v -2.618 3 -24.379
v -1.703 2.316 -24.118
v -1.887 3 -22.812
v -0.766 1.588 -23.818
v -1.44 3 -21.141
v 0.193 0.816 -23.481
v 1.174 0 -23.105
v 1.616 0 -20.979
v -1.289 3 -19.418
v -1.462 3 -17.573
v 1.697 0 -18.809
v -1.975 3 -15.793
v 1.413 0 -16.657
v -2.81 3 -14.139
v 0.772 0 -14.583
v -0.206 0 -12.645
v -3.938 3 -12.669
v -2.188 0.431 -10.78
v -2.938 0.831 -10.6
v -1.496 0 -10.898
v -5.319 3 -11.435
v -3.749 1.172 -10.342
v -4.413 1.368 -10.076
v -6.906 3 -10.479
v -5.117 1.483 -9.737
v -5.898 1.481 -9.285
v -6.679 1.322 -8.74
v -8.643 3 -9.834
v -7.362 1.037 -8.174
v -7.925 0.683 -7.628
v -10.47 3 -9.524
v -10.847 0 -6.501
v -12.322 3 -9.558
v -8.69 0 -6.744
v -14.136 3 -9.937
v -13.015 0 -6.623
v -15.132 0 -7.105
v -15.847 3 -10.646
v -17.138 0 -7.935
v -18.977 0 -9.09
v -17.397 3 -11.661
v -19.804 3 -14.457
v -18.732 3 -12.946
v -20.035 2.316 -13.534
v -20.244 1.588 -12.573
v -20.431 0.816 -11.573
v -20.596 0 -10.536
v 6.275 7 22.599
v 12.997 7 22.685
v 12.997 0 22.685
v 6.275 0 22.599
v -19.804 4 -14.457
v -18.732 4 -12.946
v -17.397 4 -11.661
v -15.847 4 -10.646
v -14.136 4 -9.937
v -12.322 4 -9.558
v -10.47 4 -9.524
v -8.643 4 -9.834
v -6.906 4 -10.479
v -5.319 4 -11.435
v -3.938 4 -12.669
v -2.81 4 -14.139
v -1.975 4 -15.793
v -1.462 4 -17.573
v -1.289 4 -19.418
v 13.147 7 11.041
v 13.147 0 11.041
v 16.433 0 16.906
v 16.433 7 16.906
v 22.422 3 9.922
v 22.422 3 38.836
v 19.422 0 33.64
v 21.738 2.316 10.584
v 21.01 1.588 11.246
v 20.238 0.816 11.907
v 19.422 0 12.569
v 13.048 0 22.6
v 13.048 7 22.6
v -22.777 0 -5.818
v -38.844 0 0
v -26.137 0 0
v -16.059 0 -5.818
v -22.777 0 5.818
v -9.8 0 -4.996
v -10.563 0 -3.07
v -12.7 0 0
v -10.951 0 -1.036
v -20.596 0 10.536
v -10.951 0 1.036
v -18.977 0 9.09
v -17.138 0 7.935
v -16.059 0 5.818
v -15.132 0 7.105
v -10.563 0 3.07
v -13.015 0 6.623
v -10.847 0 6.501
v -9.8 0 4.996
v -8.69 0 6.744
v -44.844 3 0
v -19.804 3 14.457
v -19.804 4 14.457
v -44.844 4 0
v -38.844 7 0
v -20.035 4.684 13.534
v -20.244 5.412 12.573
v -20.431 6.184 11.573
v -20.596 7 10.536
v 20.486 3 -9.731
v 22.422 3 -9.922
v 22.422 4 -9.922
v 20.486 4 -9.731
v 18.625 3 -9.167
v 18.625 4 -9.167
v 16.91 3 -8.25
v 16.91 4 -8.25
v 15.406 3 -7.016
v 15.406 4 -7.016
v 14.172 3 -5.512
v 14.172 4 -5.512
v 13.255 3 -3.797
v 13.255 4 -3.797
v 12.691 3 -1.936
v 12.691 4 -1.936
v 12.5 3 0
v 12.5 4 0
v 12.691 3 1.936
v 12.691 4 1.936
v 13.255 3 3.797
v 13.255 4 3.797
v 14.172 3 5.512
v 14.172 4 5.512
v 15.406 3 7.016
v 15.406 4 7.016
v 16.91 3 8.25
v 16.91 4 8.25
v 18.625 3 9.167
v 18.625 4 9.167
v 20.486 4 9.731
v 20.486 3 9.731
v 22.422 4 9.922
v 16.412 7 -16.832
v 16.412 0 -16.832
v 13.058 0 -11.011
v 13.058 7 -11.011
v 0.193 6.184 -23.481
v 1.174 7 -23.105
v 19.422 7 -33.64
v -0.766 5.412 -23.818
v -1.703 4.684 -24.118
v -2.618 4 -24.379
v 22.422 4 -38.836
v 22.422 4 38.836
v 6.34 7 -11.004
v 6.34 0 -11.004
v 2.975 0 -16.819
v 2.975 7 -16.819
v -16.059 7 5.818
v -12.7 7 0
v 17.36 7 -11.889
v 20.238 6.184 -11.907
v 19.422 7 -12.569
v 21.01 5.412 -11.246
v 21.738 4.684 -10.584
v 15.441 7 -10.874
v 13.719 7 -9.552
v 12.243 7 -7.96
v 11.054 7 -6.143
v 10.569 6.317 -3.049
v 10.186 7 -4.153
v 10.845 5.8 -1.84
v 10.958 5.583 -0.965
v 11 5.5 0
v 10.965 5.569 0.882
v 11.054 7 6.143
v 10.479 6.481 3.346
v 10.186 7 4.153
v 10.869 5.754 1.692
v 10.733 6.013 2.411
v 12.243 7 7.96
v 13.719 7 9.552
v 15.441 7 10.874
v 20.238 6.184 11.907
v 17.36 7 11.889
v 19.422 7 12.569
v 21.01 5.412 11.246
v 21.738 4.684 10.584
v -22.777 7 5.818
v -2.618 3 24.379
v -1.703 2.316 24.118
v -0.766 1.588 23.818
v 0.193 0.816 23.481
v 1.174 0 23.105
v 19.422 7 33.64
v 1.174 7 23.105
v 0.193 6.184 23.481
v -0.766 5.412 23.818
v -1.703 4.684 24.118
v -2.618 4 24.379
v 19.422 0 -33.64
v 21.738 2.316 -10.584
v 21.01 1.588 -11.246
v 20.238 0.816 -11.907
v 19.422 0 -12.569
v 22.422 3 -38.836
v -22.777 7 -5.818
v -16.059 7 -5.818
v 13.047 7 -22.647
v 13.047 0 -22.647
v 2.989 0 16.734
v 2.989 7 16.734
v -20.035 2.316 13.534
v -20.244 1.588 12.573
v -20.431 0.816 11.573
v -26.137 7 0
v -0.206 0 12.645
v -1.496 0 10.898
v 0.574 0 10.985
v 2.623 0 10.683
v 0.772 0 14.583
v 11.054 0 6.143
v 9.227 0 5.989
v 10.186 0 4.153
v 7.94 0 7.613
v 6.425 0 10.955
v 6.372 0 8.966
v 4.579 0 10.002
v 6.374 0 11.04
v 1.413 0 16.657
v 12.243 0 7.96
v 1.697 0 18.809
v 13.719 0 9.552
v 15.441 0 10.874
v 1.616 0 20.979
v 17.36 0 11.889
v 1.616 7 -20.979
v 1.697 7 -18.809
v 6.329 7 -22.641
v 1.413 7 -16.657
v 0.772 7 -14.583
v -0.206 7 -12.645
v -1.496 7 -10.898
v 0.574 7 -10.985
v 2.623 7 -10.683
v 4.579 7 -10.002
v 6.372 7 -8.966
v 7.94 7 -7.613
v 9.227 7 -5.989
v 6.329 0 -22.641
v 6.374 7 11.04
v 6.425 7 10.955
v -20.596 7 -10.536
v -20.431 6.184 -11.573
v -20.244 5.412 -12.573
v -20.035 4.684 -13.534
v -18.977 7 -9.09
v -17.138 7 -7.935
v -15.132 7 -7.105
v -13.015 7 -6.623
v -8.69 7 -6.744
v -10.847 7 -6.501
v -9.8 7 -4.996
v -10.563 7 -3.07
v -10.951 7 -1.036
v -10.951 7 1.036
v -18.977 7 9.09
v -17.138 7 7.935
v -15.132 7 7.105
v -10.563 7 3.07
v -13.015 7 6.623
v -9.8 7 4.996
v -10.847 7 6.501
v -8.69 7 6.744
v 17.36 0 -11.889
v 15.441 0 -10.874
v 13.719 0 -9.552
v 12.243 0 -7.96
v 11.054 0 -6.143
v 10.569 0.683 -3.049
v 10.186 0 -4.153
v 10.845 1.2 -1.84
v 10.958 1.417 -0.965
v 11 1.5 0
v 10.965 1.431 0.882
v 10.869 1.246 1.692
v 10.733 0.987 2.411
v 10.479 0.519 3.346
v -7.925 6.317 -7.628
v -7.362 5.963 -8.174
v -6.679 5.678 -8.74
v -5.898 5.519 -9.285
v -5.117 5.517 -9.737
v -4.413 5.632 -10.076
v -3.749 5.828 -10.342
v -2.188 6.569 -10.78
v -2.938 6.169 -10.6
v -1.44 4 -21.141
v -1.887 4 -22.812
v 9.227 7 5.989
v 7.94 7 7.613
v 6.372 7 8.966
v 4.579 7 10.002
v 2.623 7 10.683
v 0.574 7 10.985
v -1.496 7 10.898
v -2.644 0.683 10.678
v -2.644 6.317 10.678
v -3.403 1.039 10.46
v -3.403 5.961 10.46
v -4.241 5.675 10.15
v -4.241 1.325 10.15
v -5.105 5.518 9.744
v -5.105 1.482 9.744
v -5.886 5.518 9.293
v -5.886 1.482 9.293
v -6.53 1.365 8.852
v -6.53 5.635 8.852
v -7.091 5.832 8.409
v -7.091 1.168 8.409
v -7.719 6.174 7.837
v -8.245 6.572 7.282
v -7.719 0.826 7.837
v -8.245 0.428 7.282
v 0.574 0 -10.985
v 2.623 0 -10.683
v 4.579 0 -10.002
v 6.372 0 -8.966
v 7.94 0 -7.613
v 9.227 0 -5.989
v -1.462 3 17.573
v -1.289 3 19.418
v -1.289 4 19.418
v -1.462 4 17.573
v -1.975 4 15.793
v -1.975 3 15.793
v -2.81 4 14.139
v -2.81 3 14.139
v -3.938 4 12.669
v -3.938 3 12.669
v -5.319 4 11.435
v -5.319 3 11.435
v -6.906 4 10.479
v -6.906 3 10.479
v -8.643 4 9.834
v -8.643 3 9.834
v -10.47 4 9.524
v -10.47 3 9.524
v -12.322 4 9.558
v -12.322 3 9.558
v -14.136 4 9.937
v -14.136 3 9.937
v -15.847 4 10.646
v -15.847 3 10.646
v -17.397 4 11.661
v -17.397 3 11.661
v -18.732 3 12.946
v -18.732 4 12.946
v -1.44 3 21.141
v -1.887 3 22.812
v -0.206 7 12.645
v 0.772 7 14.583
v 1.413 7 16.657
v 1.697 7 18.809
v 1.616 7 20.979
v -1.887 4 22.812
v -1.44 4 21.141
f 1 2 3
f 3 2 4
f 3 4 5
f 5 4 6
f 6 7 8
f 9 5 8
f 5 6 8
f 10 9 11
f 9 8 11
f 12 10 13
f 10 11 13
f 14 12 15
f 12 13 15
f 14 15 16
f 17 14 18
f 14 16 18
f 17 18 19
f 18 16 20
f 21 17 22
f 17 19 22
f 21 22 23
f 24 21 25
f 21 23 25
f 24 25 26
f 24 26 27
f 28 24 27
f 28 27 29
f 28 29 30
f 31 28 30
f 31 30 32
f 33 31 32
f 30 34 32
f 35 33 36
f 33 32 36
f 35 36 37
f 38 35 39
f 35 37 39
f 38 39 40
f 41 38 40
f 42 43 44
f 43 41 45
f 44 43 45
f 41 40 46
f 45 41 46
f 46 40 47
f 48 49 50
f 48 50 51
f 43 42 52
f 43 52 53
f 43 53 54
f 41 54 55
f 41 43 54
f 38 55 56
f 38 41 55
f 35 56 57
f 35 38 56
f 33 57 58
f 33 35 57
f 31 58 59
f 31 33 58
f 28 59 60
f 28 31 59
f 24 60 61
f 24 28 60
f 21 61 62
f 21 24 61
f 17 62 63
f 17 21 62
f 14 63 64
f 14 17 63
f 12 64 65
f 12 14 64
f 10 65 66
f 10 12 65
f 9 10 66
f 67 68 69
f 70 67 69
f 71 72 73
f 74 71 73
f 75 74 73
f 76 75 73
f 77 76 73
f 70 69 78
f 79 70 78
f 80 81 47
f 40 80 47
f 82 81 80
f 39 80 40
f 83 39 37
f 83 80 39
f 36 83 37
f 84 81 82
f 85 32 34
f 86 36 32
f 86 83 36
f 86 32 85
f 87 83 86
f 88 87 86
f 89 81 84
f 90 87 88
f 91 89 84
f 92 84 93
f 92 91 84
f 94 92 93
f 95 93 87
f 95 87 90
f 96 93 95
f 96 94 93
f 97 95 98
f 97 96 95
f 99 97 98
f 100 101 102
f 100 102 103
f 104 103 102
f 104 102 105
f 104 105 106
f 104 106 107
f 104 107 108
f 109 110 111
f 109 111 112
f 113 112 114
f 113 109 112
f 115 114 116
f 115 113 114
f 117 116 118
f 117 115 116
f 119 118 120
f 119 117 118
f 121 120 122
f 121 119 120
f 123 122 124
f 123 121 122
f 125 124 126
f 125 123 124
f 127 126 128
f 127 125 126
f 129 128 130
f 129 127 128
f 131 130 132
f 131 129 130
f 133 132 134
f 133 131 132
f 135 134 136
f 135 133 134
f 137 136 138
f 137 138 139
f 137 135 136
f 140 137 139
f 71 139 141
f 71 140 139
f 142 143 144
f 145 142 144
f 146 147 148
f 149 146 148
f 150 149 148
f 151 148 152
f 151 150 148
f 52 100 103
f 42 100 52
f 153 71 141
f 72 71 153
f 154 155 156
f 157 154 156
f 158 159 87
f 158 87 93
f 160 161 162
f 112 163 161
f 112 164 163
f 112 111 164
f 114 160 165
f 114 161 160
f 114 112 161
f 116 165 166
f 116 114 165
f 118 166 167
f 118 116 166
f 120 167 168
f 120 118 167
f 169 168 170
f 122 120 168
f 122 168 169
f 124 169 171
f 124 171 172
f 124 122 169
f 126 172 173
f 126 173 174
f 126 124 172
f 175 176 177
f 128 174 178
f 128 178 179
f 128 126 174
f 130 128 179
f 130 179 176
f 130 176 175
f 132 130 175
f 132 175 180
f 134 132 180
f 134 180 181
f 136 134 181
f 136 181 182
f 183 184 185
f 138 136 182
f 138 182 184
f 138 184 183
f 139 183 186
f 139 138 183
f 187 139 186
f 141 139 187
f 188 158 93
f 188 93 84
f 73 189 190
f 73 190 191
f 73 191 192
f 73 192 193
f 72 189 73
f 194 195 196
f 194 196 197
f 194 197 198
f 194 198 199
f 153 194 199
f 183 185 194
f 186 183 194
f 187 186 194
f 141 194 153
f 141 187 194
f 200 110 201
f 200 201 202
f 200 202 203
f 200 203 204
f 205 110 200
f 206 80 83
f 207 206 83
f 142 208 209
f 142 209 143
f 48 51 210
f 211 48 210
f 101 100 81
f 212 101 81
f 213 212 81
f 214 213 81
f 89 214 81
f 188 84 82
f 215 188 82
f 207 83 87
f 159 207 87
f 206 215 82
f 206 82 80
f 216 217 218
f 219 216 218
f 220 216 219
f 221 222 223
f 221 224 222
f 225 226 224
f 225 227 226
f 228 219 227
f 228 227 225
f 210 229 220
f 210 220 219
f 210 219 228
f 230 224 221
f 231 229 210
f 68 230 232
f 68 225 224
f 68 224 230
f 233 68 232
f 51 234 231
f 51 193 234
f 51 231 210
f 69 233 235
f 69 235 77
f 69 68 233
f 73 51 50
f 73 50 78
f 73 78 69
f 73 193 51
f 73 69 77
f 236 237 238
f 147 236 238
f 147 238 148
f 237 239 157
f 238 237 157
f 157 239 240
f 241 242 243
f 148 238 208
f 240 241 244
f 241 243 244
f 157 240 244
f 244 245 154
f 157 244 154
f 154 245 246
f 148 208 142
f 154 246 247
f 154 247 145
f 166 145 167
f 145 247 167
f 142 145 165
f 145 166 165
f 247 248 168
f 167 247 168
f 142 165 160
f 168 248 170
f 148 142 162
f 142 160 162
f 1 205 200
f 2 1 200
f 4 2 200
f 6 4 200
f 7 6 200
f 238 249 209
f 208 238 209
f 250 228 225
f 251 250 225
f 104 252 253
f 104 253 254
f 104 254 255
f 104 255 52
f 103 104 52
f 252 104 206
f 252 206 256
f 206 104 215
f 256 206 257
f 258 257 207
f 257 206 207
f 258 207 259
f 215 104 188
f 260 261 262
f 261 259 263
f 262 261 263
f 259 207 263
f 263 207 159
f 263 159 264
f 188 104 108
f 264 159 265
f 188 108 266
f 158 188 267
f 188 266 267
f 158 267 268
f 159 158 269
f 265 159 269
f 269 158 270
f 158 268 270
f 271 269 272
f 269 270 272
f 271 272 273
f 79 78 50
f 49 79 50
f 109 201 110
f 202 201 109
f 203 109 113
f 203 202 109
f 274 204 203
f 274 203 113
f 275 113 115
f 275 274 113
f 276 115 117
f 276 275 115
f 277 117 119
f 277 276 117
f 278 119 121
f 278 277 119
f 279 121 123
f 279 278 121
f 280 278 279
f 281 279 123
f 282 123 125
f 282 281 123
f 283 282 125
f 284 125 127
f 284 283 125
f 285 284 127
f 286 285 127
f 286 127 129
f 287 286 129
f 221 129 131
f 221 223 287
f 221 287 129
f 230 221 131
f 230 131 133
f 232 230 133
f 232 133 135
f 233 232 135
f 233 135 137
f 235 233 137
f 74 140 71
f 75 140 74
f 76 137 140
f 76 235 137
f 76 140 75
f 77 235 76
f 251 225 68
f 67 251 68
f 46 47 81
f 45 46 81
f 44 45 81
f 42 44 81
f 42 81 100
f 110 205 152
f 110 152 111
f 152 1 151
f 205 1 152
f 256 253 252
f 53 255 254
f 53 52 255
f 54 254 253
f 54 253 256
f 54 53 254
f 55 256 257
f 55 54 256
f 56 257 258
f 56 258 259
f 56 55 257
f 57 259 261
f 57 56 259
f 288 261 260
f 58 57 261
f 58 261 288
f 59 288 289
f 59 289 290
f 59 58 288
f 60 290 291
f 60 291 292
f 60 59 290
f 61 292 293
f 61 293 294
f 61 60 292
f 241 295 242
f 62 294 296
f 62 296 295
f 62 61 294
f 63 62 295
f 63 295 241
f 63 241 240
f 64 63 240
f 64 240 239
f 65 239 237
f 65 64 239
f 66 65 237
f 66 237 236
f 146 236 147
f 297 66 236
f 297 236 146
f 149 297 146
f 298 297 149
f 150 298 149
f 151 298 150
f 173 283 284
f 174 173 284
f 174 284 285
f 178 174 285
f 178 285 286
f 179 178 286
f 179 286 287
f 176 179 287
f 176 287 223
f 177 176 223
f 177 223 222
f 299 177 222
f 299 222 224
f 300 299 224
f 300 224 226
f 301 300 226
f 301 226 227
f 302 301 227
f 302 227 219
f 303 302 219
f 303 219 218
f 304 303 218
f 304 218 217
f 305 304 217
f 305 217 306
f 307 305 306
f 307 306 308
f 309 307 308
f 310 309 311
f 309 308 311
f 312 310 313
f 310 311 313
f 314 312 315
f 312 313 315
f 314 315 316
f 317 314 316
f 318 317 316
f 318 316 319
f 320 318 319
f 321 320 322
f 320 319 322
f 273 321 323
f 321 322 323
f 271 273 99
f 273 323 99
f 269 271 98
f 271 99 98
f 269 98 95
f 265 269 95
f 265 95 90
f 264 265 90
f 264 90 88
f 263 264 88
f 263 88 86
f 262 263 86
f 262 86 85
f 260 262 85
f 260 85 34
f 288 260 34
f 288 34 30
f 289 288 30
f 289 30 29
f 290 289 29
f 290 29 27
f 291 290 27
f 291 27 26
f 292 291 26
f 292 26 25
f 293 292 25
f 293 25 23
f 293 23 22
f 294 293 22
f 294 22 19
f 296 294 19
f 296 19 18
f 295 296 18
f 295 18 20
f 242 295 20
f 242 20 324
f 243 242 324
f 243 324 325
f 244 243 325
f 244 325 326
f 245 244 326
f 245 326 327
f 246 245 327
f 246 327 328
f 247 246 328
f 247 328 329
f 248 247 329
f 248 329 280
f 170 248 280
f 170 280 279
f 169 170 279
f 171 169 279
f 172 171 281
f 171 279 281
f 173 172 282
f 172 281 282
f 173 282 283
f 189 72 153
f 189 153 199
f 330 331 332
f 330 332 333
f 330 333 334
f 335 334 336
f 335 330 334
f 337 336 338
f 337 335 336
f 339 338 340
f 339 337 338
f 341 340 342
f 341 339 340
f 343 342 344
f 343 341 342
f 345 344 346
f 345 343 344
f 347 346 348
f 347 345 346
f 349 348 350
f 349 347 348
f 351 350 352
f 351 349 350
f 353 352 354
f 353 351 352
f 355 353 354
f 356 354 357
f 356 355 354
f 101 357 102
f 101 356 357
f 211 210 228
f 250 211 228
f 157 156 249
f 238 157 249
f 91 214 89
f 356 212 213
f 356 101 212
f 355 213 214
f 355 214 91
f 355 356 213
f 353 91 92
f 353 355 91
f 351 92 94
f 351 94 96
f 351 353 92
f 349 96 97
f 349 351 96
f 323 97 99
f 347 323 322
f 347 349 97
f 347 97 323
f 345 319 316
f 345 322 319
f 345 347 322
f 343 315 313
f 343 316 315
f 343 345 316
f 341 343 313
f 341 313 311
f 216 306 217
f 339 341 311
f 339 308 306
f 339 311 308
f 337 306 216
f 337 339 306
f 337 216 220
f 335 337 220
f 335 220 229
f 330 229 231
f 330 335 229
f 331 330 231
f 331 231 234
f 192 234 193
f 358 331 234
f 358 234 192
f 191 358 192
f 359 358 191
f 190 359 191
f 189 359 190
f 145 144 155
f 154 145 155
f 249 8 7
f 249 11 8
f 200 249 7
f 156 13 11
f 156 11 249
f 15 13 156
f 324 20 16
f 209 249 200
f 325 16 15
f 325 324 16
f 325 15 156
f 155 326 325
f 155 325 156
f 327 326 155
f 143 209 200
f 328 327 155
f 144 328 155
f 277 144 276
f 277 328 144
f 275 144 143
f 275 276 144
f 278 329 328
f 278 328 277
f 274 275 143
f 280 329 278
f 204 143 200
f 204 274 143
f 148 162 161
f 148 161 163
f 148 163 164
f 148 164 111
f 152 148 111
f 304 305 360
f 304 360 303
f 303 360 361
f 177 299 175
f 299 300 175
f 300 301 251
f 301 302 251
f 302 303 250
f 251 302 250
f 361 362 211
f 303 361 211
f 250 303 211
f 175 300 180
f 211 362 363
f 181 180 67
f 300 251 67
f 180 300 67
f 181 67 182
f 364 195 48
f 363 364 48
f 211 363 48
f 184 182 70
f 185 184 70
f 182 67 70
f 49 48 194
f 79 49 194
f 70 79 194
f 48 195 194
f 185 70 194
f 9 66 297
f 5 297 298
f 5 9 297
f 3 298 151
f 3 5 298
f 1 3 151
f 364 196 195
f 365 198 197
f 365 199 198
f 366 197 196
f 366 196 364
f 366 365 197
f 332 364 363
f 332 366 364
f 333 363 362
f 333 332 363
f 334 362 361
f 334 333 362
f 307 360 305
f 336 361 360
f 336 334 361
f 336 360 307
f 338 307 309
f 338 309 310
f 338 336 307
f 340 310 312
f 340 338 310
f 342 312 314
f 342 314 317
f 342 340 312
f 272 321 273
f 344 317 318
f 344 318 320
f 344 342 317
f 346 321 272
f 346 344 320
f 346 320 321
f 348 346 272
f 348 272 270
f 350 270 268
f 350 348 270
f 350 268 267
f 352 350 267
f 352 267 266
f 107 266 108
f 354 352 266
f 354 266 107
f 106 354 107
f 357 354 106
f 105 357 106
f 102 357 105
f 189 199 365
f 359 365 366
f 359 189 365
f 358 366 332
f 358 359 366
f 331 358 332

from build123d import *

# Parameters (mm, degrees)
F0_R         = 11
F1_DEPTH     = 7
F2_T1_DEPTH  = 44.3442261521
F2_T3_DEPTH  = 44.3442261521
F2_T5_DEPTH  = 44.3442261521
F2_T7_DEPTH  = 44.3442261521
F2_T9_DEPTH  = 44.3442261521
F2_T11_DEPTH = 44.3442261521
F2_T14_ANGLE = 269.2452016921
F2_T16_ANGLE = 269.2452016921
F2_T18_ANGLE = 269.2452016921
F2_T20_ANGLE = 269.2452016921
F2_T22_ANGLE = 269.2452016921
F2_T24_ANGLE = 269.2452016921
F4_DEPTH     = 25.4
F5_DEPTH     = 25.4


# Not quite as in the source:
# - a fillet or chamfer that OpenCascade refuses, or shapes differently, is made with other operations: its cross-section is extruded or revolved along the edge and cut away or added
# - a feature names something its author has since deleted; it is built from what else it names


with BuildPart() as f1:
    # F0 (on Front) → F1 (new body)
    with BuildSketch(Plane.XZ):
        with BuildLine():
            Line((-19.8038627003, 14.4570641122), (-44.8442322709, 0))
            Line((-44.8442322709, 0), (-19.8038627003, -14.4570641122))
            ThreePointArc((-19.8038627003, -14.4570641122), (-8.6430254441, -9.8340939532), (-1.2889419323, -19.4181221799))
            ThreePointArc((-1.2889419323, -19.4181221799), (-1.6270298411, -21.9861548035), (-2.6182534351, -24.3791802476))
            Line((-2.6182534351, -24.3791802476), (22.4221161354, -38.8362443598))
            Line((22.4221161354, -38.8362443598), (22.4221161354, -9.9221161354))
            ThreePointArc((22.4221161354, -9.9221161354), (12.5, 0), (22.4221161354, 9.9221161354))
            Line((22.4221161354, 9.9221161354), (22.4221161354, 38.8362443598))
            Line((22.4221161354, 38.8362443598), (-2.6182534351, 24.3791802476))
            ThreePointArc((-2.6182534351, 24.3791802476), (-1.6270298411, 21.9861548035), (-1.2889419323, 19.4181221799))
            ThreePointArc((-1.2889419323, 19.4181221799), (-8.6430254441, 9.8340939532), (-19.8038627003, 14.4570641122))
        make_face()
        Circle(F0_R, mode=Mode.SUBTRACT)
    extrude(amount=-F1_DEPTH)

    # F2: chamfer of 3 on 18 edges, made by hand

    # F2_s2 → F2_t1 (cut)
    with BuildSketch(Plane(origin=(40.3146025973, 0, 23.2756466618), x_dir=(0, 1, 0), z_dir=(-0.8660254038, 0, -0.5))):
        Polygon((7, -19.4221161354), (4, -22.4221161354), (7, -22.4221161354), align=None)
        Polygon((3, -22.4221161354), (0, -19.4221161354), (0, -22.4221161354), align=None)
    extrude(amount=F2_T1_DEPTH, mode=Mode.SUBTRACT)

    # F2_s4 → F2_t3 (cut)
    with BuildSketch(Plane(origin=(-1.9113762384, 0, -1.1035335858), x_dir=(0, 1, 0), z_dir=(-0.8660254038, 0, -0.5))):
        Polygon((3, -22.4221161354), (0, -19.4221161354), (0, -22.4221161354), align=None)
        Polygon((4, -22.4221161354), (7, -19.4221161354), (7, -22.4221161354), align=None)
    extrude(amount=F2_T3_DEPTH, mode=Mode.SUBTRACT)

    # F2_s6 → F2_t5 (cut)
    with BuildSketch(Plane(origin=(-40.3146025973, 0, 23.2756466618), x_dir=(0, 1, 0), z_dir=(0.8660254038, 0, -0.5))):
        Polygon((0, -19.4221161354), (3, -22.4221161354), (0, -22.4221161354), align=None)
        Polygon((7, -19.4221161354), (4, -22.4221161354), (7, -22.4221161354), align=None)
    extrude(amount=F2_T5_DEPTH, mode=Mode.SUBTRACT)

    # F2_s8 → F2_t7 (cut)
    with BuildSketch(Plane(origin=(1.9113762384, 0, -1.1035335858), x_dir=(0, 1, 0), z_dir=(0.8660254038, 0, -0.5))):
        Polygon((3, -22.4221161354), (0, -19.4221161354), (0, -22.4221161354), align=None)
        Polygon((7, -19.4221161354), (4, -22.4221161354), (7, -22.4221161354), align=None)
    extrude(amount=F2_T7_DEPTH, mode=Mode.SUBTRACT)

    # F2_s10 → F2_t9 (cut)
    with BuildSketch(Plane.XY.offset(-46.5512933237)):
        Polygon((22.4221161354, 3), (19.4221161354, 0), (22.4221161354, 0), align=None)
        Polygon((19.4221161354, 7), (22.4221161354, 4), (22.4221161354, 7), align=None)
    extrude(amount=F2_T9_DEPTH, mode=Mode.SUBTRACT)

    # F2_s12 → F2_t11 (cut)
    with BuildSketch(Plane.XY.offset(2.2070671715)):
        Polygon((22.4221161354, 3), (19.4221161354, 0), (22.4221161354, 0), align=None)
        Polygon((19.4221161354, 7), (22.4221161354, 4), (22.4221161354, 7), align=None)
    extrude(amount=F2_T11_DEPTH, mode=Mode.SUBTRACT)

    # F2_s13 → F2_t14 (revolve, cut)
    with BuildSketch(Plane(origin=(4.0288460704, 0, 15.4420044307), x_dir=(0, 1, 0), z_dir=(0.2524510604, 0, 0.9676096641))):
        Polygon((0, 28.6721698019), (3, 25.6721698019), (0, 25.6721698019), align=None)
    revolve(axis=Axis((-11.2110580677, 0, 19.4181221799), (0, -1, 0)), revolution_arc=F2_T14_ANGLE, mode=Mode.SUBTRACT)

    # F2_s15 → F2_t16 (revolve, cut)
    with BuildSketch(Plane(origin=(-15.3875911575, 0, 4.2319191704), x_dir=(0, 1, 0), z_dir=(-0.9642000803, 0, 0.2651758006))):
        Polygon((7, -28.6721698019), (4, -25.6721698019), (7, -25.6721698019), align=None)
    revolve(axis=Axis((-11.2110580677, 7, 19.4181221799), (0, 1, 0)), revolution_arc=F2_T16_ANGLE, mode=Mode.SUBTRACT)

    # F2_s17 → F2_t18 (revolve, cut)
    with BuildSketch(Plane(origin=(-15.3875911575, 0, -4.2319191704), x_dir=(0, 1, 0), z_dir=(-0.9642000803, 0, -0.2651758006))):
        Polygon((3, 25.6721698019), (0, 28.6721698019), (0, 25.6721698019), align=None)
    revolve(axis=Axis((-11.2110580677, 0, -19.4181221799), (0, -1, 0)), revolution_arc=F2_T18_ANGLE, mode=Mode.SUBTRACT)

    # F2_s19 → F2_t20 (revolve, cut)
    with BuildSketch(Plane(origin=(4.0288460704, 0, -15.4420044307), x_dir=(0, 1, 0), z_dir=(0.2524510604, 0, -0.9676096641))):
        Polygon((7, -28.6721698019), (4, -25.6721698019), (7, -25.6721698019), align=None)
    revolve(axis=Axis((-11.2110580677, 7, -19.4181221799), (0, 1, 0)), revolution_arc=F2_T20_ANGLE, mode=Mode.SUBTRACT)

    # F2_s21 → F2_t22 (revolve, cut)
    with BuildSketch(Plane(origin=(11.3587450871, 0, 11.2100852602), x_dir=(0, 1, 0), z_dir=(0.7117490199, 0, 0.7024338636))):
        Polygon((3, -25.6721698019), (0, -28.6721698019), (0, -25.6721698019), align=None)
    revolve(axis=Axis((22.4221161354, 0, 0), (0, 1, 0)), revolution_arc=F2_T22_ANGLE, mode=Mode.SUBTRACT)

    # F2_s23 → F2_t24 (revolve, cut)
    with BuildSketch(Plane(origin=(11.3587450871, 0, 11.2100852602), x_dir=(0, 1, 0), z_dir=(0.7117490199, 0, 0.7024338636))):
        Polygon((7, -28.6721698019), (4, -25.6721698019), (7, -25.6721698019), align=None)
    revolve(axis=Axis((22.4221161354, 7, 0), (0, 1, 0)), revolution_arc=F2_T24_ANGLE, mode=Mode.SUBTRACT)

    # F3 (on face) → F4 (cut)
    with BuildSketch(Plane.XZ):
        Polygon((13.0480463402, 22.5998792008), (6.3740697952, 11.0402127363), (6.4247100072, 10.9550491246), (13.1471202974, 11.0414866405), (16.4334683579, 16.9064834844), align=None)
        Polygon((2.9886477775, 16.7336084526), (6.3740697952, 11.0402127363), (13.0480463402, 22.5998792008), (12.9974061282, 22.6850428125), (6.274995838, 22.5986052966), align=None)
        Polygon((-26.1366, 0), (-12.7, 0), (-16.05915, 5.8182184702), (-22.77745, 5.8182184702), align=None)
        Polygon((-16.05915, -5.8182184702), (-12.7, 0), (-26.1366, 0), (-22.77745, -5.8182184702), align=None)
    extrude(amount=-F4_DEPTH, mode=Mode.SUBTRACT)

    # F3 (on face) → F5 (cut)
    with BuildSketch(Plane.XZ):
        Polygon((2.9886477775, 16.7336084526), (6.3740697952, 11.0402127363), (13.0480463402, 22.5998792008), (12.9974061282, 22.6850428125), (6.274995838, 22.5986052966), align=None)
        Polygon((13.0480463402, 22.5998792008), (6.3740697952, 11.0402127363), (6.4247100072, 10.9550491246), (13.1471202974, 11.0414866405), (16.4334683579, 16.9064834844), align=None)
        Polygon((-16.05915, -5.8182184702), (-12.7, 0), (-26.1366, 0), (-22.77745, -5.8182184702), align=None)
        Polygon((-26.1366, 0), (-12.7, 0), (-16.05915, 5.8182184702), (-22.77745, 5.8182184702), align=None)
        Polygon((13.0581752927, -11.0105414452), (6.3398781361, -11.0043602821), (13.0474692042, -22.6469734606), (16.4119708267, -16.8318480344), align=None)
        Polygon((13.0474692042, -22.6469734606), (6.3398781361, -11.0043602821), (2.9753765137, -16.8194857083), (6.3291720477, -22.6407922976), align=None)
    extrude(amount=-F5_DEPTH, mode=Mode.SUBTRACT)


solid = f1.part
